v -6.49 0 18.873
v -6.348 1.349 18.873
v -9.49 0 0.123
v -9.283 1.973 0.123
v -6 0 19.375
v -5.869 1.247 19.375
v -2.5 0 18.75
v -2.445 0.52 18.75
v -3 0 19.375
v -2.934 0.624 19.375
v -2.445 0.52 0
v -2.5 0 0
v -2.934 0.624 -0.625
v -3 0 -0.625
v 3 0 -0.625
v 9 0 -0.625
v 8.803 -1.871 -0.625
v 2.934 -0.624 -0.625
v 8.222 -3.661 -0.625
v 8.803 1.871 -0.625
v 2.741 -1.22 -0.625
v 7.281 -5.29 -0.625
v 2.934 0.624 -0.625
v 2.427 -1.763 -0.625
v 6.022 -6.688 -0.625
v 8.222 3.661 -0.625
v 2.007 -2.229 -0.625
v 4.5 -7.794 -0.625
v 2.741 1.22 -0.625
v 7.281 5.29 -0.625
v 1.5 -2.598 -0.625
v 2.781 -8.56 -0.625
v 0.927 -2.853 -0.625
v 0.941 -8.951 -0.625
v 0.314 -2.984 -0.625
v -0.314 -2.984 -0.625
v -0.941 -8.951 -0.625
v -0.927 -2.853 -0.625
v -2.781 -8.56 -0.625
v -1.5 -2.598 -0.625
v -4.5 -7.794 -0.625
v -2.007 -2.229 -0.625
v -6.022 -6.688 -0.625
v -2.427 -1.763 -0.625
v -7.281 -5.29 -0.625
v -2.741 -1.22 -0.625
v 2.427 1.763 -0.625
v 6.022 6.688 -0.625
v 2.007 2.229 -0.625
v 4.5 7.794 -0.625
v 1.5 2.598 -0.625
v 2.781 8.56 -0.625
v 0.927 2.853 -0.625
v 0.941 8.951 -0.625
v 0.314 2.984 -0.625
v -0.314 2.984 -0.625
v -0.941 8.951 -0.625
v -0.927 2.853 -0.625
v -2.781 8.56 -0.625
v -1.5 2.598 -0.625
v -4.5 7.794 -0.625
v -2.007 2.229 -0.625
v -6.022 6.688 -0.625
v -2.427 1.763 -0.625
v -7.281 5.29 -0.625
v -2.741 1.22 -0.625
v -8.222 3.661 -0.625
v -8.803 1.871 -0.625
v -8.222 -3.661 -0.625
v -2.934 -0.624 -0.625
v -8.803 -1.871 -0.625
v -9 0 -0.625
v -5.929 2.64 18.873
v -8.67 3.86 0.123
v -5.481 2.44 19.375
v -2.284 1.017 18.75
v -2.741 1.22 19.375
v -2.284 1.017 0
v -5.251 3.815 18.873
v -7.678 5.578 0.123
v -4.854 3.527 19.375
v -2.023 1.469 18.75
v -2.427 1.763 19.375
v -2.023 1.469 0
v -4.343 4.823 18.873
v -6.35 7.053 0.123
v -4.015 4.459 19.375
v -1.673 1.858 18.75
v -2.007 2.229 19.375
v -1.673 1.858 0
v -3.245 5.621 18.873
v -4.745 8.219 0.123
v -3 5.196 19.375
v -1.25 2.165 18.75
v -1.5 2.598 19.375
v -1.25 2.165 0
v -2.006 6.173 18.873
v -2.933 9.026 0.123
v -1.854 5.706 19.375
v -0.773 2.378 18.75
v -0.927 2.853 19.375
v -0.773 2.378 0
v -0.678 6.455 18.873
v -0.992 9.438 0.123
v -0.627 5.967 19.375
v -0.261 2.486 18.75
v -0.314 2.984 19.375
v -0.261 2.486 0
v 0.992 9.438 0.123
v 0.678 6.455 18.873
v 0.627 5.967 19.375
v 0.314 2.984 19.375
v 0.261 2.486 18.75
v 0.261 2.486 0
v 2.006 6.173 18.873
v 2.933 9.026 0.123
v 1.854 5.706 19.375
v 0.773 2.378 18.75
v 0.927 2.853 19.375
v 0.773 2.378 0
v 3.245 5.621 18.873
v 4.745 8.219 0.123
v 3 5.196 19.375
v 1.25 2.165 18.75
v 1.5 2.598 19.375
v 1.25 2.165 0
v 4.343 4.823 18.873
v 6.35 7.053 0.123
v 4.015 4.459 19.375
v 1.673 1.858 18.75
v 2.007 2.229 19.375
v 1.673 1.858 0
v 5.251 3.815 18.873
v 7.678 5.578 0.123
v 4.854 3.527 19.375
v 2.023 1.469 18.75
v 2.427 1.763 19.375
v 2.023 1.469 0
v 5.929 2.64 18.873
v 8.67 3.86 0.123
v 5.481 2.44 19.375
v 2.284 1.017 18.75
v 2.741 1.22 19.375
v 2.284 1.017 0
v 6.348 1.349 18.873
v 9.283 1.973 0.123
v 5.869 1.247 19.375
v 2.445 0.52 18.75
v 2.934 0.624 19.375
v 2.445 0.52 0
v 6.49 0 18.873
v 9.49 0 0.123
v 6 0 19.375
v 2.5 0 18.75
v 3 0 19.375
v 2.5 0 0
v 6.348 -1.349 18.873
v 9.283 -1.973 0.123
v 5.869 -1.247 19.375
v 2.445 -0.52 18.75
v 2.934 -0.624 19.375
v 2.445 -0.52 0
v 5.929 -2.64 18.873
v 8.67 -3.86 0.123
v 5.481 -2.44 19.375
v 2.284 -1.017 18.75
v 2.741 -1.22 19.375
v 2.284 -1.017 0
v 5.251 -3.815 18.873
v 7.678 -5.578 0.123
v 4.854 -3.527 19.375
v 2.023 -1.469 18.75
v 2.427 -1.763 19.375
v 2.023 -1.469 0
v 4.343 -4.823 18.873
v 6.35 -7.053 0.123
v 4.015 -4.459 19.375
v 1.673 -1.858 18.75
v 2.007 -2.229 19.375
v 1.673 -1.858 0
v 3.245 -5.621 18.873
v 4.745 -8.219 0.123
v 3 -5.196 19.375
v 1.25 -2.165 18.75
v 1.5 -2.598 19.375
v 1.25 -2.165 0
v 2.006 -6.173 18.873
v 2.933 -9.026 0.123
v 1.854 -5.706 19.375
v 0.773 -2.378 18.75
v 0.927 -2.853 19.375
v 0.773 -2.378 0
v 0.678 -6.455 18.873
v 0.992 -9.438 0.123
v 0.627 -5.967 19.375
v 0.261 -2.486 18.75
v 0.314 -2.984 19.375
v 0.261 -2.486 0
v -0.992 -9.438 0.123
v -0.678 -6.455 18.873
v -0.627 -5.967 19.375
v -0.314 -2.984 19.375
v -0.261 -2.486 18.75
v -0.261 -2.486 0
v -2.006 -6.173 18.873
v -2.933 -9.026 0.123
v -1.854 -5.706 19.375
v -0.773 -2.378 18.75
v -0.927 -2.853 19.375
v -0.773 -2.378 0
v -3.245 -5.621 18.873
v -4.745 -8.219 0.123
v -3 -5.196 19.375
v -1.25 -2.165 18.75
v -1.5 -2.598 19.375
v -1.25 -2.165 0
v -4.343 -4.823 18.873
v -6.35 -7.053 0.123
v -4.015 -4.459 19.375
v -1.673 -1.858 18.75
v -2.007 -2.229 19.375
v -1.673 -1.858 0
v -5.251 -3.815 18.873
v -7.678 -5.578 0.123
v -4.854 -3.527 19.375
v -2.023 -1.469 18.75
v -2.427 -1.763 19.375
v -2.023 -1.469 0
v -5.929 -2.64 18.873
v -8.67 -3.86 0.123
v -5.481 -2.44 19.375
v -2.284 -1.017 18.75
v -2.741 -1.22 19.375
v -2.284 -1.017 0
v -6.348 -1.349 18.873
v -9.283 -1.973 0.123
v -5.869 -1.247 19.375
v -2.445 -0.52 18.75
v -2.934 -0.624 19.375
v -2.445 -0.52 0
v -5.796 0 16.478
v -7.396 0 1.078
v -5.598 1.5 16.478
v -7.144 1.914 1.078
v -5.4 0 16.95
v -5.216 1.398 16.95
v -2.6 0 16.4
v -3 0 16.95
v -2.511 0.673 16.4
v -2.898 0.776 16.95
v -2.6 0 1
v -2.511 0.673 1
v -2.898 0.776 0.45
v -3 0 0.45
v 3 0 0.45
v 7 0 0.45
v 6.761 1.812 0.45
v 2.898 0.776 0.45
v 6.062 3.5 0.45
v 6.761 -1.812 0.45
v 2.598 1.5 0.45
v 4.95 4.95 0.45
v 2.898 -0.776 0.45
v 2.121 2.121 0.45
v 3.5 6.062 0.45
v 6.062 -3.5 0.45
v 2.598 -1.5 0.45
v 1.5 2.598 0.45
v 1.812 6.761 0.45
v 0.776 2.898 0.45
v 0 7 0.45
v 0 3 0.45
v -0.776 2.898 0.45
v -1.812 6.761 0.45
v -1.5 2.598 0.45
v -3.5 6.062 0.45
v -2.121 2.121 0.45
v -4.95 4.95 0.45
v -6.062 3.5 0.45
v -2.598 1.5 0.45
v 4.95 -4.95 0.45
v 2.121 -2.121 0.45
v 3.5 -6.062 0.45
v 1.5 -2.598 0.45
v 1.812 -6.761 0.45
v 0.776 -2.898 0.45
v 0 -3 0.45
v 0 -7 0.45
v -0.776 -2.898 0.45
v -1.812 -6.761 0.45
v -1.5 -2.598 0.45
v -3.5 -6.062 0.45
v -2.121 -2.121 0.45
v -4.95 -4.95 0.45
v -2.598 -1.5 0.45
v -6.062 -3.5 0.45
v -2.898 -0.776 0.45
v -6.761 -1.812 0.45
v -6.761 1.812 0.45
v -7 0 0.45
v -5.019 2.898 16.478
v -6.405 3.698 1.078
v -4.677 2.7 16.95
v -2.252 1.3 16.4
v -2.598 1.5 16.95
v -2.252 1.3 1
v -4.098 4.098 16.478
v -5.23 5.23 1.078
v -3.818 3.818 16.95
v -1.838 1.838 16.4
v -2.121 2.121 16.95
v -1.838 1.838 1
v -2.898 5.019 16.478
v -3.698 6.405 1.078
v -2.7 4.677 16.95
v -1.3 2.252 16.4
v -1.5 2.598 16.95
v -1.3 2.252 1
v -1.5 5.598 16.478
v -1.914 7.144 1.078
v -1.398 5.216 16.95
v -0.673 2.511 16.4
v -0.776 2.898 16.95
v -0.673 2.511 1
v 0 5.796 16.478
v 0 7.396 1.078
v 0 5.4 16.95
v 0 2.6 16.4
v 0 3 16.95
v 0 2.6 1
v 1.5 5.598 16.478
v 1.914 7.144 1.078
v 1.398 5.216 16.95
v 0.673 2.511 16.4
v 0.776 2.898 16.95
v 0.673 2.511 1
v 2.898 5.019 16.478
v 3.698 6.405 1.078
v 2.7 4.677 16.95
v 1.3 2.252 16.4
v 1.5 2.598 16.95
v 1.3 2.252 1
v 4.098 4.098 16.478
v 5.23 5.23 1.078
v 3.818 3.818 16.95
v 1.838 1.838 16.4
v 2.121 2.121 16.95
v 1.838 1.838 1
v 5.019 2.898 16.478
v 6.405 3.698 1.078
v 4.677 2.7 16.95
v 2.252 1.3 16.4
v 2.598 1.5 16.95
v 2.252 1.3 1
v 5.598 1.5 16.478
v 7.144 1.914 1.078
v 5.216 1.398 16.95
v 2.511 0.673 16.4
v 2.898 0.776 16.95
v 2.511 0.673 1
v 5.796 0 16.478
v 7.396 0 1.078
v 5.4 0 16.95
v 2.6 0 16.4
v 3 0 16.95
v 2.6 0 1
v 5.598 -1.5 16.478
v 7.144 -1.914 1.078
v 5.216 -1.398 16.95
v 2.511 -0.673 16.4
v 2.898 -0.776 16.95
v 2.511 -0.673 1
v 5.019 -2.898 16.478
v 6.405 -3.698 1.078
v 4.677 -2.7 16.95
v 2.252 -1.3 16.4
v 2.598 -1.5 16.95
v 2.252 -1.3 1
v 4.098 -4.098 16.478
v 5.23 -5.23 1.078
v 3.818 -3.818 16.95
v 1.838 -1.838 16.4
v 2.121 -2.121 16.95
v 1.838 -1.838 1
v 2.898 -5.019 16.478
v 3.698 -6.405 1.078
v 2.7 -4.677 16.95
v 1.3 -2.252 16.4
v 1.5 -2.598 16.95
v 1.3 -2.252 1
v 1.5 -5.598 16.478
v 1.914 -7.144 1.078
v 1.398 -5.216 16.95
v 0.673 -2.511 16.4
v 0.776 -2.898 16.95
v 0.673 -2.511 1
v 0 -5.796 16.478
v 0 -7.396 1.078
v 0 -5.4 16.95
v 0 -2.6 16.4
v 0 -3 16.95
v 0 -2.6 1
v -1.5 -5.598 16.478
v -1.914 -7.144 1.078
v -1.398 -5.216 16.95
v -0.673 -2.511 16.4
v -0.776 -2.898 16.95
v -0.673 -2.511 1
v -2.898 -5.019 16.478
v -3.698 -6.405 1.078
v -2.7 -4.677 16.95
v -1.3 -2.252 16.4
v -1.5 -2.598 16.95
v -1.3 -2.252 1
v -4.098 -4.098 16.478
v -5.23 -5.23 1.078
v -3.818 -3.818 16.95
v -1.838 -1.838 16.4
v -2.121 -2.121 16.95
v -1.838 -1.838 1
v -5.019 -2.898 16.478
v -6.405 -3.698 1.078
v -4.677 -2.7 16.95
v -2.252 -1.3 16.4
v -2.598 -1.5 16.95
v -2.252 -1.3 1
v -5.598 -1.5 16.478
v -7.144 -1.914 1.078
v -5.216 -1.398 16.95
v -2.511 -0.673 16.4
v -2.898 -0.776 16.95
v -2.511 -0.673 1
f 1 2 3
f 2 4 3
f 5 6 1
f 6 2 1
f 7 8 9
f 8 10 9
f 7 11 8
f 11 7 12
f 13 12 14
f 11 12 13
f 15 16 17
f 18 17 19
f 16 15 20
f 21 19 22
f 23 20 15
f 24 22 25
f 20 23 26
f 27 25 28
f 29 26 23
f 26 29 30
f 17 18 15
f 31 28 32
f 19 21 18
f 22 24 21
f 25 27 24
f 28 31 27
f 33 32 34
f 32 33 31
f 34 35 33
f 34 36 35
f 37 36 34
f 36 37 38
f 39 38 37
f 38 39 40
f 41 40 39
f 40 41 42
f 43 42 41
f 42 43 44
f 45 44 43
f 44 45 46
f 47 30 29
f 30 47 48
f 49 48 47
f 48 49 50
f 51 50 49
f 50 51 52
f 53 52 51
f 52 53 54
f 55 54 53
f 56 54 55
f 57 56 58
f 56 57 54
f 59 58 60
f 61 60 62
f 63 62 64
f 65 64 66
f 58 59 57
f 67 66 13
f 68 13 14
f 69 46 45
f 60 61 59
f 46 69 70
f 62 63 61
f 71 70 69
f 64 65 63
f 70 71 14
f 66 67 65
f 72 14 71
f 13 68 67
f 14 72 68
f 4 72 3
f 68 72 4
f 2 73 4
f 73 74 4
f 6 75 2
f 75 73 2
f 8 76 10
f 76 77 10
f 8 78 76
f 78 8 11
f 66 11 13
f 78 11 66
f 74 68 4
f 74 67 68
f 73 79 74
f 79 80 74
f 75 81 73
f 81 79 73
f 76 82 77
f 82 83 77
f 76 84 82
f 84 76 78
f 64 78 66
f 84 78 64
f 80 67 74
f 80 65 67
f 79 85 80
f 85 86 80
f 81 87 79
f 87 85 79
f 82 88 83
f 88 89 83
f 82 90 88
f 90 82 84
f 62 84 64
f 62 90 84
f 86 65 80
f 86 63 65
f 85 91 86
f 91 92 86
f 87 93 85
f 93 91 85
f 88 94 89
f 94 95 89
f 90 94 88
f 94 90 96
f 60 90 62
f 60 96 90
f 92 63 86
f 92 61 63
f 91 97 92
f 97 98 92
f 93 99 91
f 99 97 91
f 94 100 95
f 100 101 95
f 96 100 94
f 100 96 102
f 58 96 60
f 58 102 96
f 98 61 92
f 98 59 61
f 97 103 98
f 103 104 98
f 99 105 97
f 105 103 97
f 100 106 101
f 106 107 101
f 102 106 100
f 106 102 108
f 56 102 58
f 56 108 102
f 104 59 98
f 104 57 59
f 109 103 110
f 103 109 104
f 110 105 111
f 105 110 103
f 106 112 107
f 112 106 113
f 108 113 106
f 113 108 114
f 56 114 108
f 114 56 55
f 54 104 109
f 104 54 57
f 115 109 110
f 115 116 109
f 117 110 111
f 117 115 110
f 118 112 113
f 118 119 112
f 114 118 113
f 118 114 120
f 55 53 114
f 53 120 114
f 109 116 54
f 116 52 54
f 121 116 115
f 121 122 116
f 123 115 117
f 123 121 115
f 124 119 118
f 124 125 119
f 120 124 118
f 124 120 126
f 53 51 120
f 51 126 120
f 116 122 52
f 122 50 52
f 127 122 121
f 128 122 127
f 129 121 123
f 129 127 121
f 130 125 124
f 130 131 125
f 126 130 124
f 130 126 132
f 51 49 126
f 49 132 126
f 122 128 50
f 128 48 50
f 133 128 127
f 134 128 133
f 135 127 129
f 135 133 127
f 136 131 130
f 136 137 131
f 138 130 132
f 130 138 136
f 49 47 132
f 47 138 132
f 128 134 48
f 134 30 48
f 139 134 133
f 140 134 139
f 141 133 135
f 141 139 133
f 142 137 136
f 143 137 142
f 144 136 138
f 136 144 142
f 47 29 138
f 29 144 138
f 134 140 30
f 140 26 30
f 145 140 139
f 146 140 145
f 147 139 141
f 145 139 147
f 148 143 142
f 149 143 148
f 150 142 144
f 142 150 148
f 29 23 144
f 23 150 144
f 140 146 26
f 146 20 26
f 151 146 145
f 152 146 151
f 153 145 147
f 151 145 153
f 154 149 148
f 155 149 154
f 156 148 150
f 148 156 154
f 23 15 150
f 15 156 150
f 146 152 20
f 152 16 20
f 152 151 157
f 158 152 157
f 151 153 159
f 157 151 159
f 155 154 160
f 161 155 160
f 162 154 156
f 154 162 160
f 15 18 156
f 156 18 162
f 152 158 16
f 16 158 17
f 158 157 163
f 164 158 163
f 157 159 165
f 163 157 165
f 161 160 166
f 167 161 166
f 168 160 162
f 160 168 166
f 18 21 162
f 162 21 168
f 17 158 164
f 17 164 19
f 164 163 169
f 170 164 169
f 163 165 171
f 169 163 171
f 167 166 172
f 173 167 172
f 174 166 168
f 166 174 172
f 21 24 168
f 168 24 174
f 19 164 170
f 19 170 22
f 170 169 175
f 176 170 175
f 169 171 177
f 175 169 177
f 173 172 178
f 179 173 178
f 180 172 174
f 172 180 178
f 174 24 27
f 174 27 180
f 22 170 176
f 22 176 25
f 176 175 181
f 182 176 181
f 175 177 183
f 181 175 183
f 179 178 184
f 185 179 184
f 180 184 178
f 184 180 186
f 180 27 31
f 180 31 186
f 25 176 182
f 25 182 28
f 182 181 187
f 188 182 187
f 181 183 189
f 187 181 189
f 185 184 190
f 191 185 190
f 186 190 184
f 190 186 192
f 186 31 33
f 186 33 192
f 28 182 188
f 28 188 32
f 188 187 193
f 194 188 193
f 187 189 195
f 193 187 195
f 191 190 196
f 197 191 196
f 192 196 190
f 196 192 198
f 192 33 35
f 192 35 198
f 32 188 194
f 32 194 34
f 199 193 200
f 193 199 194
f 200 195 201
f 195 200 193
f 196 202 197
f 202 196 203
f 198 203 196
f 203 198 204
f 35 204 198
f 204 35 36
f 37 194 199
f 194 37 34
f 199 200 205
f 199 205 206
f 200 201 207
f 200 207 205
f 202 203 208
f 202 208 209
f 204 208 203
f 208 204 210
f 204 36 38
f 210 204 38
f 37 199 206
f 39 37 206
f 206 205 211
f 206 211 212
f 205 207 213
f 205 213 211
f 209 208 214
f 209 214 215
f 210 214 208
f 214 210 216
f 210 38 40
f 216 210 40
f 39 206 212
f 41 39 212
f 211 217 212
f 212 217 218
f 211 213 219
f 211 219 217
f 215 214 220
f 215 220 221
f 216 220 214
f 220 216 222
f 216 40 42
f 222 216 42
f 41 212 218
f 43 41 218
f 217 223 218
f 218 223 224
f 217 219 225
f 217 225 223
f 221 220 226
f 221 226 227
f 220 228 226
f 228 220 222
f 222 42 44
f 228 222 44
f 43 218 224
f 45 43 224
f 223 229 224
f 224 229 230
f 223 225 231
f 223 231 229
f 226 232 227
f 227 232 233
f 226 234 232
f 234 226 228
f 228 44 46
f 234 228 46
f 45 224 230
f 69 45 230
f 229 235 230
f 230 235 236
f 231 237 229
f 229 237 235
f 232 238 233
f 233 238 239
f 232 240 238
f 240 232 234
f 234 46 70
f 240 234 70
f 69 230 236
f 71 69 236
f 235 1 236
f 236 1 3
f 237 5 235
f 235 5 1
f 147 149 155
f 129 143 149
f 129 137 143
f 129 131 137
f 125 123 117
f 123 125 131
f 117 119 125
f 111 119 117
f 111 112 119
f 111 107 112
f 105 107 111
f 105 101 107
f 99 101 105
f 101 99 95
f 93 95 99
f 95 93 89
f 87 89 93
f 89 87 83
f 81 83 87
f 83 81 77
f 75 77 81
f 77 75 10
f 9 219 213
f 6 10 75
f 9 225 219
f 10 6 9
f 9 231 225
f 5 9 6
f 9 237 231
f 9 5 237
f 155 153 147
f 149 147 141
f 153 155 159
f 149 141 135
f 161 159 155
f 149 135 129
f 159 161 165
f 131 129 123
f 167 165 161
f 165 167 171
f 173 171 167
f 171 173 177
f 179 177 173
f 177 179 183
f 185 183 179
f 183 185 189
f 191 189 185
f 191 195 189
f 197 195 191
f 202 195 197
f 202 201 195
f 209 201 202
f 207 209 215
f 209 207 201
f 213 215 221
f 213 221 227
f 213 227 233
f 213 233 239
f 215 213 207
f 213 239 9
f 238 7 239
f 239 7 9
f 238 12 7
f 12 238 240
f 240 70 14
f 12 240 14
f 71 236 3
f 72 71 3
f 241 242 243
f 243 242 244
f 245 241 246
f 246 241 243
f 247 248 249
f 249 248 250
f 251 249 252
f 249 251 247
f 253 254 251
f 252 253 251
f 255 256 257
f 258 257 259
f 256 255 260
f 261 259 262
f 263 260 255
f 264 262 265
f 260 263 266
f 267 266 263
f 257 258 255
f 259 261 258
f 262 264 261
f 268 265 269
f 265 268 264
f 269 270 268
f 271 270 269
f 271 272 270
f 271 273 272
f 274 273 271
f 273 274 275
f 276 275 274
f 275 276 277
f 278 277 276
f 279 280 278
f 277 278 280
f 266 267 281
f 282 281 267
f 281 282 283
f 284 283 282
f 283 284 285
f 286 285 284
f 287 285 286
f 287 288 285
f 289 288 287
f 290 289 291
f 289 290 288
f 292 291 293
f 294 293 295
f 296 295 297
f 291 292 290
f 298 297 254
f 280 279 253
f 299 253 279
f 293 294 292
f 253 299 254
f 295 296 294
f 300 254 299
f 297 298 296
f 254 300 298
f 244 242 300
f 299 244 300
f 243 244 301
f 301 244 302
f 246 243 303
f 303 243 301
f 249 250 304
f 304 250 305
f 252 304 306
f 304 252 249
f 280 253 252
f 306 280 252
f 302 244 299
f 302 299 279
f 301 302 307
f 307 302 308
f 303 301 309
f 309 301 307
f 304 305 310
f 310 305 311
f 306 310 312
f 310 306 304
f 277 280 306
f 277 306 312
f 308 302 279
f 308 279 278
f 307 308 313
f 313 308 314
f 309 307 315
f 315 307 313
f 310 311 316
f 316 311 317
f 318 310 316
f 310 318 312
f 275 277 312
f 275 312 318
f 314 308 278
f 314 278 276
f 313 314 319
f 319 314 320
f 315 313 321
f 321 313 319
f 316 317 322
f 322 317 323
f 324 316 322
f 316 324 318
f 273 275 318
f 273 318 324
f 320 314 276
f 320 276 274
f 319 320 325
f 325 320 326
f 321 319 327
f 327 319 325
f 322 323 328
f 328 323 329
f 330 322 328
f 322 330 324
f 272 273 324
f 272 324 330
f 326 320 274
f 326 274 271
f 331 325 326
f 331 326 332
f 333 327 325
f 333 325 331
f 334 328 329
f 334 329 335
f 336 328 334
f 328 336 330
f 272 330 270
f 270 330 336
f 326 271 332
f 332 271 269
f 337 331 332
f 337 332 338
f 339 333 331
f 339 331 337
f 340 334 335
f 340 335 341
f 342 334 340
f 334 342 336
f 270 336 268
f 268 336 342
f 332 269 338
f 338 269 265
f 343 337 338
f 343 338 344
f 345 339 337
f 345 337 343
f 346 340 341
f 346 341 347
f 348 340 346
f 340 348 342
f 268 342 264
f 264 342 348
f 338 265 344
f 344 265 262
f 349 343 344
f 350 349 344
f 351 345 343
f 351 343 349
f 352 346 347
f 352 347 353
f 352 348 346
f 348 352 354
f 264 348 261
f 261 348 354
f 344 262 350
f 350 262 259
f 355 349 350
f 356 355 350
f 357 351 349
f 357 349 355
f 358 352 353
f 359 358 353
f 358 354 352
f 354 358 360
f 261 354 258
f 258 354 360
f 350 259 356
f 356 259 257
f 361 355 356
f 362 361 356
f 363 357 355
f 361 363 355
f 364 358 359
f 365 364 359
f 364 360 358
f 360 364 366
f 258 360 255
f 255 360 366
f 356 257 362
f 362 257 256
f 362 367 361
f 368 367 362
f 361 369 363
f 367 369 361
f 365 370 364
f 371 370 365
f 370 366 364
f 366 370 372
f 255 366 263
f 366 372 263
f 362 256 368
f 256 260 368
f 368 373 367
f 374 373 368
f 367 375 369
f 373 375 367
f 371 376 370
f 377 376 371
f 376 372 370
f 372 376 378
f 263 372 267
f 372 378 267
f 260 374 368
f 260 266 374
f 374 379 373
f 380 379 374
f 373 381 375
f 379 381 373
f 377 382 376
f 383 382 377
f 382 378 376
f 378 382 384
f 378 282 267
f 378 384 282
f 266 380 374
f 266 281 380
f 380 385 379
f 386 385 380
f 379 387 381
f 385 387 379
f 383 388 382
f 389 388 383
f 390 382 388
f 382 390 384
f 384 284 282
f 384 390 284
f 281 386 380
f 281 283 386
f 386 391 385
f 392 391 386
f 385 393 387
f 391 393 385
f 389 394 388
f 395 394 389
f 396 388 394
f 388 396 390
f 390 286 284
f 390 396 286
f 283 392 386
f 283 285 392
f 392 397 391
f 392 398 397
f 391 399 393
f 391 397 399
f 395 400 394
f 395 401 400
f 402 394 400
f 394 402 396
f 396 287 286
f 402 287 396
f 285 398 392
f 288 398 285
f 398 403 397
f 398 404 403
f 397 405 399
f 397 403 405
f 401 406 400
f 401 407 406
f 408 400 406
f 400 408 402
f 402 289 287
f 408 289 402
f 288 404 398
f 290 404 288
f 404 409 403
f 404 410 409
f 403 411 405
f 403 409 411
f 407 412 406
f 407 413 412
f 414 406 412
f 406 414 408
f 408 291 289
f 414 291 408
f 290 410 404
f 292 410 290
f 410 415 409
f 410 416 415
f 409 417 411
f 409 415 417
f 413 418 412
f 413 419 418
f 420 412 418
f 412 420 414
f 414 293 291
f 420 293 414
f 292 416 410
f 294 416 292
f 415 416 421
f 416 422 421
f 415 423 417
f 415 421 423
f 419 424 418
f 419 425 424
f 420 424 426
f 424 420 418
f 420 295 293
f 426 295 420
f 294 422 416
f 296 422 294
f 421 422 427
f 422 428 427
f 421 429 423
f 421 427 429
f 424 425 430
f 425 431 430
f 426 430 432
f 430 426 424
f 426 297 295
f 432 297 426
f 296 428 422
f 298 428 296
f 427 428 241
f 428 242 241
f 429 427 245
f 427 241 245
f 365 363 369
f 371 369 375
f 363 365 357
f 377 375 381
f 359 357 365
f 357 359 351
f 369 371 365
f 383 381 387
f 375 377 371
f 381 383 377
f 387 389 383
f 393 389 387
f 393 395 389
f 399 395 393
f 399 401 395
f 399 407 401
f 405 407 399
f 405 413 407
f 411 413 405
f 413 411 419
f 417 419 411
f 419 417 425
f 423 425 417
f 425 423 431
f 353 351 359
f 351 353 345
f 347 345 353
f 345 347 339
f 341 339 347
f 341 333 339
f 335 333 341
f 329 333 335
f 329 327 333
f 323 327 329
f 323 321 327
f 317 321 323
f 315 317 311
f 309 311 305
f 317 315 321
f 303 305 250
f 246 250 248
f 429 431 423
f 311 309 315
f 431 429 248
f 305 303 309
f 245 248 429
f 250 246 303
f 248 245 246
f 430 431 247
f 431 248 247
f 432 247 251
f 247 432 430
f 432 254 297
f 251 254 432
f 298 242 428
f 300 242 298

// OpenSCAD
module vase() {
    difference() {
        // Outer shape
        rotate_extrude(angle = 360)
        translate([3, 0, 0])
        scale([1, 1.25])
        offset(r = 0.5)
        polygon(points = [[0,0], [6,0], [3,15], [0,15]]);

        // Inner hollow
        translate([0, 0, 1])
        rotate_extrude(angle = 360)
        translate([3, 0, 0])
        scale([0.8, 1.1])
        offset(r = 0.5)
        polygon(points = [[0,0], [5,0], [3,14], [0,14]]);
    }
}

vase();
